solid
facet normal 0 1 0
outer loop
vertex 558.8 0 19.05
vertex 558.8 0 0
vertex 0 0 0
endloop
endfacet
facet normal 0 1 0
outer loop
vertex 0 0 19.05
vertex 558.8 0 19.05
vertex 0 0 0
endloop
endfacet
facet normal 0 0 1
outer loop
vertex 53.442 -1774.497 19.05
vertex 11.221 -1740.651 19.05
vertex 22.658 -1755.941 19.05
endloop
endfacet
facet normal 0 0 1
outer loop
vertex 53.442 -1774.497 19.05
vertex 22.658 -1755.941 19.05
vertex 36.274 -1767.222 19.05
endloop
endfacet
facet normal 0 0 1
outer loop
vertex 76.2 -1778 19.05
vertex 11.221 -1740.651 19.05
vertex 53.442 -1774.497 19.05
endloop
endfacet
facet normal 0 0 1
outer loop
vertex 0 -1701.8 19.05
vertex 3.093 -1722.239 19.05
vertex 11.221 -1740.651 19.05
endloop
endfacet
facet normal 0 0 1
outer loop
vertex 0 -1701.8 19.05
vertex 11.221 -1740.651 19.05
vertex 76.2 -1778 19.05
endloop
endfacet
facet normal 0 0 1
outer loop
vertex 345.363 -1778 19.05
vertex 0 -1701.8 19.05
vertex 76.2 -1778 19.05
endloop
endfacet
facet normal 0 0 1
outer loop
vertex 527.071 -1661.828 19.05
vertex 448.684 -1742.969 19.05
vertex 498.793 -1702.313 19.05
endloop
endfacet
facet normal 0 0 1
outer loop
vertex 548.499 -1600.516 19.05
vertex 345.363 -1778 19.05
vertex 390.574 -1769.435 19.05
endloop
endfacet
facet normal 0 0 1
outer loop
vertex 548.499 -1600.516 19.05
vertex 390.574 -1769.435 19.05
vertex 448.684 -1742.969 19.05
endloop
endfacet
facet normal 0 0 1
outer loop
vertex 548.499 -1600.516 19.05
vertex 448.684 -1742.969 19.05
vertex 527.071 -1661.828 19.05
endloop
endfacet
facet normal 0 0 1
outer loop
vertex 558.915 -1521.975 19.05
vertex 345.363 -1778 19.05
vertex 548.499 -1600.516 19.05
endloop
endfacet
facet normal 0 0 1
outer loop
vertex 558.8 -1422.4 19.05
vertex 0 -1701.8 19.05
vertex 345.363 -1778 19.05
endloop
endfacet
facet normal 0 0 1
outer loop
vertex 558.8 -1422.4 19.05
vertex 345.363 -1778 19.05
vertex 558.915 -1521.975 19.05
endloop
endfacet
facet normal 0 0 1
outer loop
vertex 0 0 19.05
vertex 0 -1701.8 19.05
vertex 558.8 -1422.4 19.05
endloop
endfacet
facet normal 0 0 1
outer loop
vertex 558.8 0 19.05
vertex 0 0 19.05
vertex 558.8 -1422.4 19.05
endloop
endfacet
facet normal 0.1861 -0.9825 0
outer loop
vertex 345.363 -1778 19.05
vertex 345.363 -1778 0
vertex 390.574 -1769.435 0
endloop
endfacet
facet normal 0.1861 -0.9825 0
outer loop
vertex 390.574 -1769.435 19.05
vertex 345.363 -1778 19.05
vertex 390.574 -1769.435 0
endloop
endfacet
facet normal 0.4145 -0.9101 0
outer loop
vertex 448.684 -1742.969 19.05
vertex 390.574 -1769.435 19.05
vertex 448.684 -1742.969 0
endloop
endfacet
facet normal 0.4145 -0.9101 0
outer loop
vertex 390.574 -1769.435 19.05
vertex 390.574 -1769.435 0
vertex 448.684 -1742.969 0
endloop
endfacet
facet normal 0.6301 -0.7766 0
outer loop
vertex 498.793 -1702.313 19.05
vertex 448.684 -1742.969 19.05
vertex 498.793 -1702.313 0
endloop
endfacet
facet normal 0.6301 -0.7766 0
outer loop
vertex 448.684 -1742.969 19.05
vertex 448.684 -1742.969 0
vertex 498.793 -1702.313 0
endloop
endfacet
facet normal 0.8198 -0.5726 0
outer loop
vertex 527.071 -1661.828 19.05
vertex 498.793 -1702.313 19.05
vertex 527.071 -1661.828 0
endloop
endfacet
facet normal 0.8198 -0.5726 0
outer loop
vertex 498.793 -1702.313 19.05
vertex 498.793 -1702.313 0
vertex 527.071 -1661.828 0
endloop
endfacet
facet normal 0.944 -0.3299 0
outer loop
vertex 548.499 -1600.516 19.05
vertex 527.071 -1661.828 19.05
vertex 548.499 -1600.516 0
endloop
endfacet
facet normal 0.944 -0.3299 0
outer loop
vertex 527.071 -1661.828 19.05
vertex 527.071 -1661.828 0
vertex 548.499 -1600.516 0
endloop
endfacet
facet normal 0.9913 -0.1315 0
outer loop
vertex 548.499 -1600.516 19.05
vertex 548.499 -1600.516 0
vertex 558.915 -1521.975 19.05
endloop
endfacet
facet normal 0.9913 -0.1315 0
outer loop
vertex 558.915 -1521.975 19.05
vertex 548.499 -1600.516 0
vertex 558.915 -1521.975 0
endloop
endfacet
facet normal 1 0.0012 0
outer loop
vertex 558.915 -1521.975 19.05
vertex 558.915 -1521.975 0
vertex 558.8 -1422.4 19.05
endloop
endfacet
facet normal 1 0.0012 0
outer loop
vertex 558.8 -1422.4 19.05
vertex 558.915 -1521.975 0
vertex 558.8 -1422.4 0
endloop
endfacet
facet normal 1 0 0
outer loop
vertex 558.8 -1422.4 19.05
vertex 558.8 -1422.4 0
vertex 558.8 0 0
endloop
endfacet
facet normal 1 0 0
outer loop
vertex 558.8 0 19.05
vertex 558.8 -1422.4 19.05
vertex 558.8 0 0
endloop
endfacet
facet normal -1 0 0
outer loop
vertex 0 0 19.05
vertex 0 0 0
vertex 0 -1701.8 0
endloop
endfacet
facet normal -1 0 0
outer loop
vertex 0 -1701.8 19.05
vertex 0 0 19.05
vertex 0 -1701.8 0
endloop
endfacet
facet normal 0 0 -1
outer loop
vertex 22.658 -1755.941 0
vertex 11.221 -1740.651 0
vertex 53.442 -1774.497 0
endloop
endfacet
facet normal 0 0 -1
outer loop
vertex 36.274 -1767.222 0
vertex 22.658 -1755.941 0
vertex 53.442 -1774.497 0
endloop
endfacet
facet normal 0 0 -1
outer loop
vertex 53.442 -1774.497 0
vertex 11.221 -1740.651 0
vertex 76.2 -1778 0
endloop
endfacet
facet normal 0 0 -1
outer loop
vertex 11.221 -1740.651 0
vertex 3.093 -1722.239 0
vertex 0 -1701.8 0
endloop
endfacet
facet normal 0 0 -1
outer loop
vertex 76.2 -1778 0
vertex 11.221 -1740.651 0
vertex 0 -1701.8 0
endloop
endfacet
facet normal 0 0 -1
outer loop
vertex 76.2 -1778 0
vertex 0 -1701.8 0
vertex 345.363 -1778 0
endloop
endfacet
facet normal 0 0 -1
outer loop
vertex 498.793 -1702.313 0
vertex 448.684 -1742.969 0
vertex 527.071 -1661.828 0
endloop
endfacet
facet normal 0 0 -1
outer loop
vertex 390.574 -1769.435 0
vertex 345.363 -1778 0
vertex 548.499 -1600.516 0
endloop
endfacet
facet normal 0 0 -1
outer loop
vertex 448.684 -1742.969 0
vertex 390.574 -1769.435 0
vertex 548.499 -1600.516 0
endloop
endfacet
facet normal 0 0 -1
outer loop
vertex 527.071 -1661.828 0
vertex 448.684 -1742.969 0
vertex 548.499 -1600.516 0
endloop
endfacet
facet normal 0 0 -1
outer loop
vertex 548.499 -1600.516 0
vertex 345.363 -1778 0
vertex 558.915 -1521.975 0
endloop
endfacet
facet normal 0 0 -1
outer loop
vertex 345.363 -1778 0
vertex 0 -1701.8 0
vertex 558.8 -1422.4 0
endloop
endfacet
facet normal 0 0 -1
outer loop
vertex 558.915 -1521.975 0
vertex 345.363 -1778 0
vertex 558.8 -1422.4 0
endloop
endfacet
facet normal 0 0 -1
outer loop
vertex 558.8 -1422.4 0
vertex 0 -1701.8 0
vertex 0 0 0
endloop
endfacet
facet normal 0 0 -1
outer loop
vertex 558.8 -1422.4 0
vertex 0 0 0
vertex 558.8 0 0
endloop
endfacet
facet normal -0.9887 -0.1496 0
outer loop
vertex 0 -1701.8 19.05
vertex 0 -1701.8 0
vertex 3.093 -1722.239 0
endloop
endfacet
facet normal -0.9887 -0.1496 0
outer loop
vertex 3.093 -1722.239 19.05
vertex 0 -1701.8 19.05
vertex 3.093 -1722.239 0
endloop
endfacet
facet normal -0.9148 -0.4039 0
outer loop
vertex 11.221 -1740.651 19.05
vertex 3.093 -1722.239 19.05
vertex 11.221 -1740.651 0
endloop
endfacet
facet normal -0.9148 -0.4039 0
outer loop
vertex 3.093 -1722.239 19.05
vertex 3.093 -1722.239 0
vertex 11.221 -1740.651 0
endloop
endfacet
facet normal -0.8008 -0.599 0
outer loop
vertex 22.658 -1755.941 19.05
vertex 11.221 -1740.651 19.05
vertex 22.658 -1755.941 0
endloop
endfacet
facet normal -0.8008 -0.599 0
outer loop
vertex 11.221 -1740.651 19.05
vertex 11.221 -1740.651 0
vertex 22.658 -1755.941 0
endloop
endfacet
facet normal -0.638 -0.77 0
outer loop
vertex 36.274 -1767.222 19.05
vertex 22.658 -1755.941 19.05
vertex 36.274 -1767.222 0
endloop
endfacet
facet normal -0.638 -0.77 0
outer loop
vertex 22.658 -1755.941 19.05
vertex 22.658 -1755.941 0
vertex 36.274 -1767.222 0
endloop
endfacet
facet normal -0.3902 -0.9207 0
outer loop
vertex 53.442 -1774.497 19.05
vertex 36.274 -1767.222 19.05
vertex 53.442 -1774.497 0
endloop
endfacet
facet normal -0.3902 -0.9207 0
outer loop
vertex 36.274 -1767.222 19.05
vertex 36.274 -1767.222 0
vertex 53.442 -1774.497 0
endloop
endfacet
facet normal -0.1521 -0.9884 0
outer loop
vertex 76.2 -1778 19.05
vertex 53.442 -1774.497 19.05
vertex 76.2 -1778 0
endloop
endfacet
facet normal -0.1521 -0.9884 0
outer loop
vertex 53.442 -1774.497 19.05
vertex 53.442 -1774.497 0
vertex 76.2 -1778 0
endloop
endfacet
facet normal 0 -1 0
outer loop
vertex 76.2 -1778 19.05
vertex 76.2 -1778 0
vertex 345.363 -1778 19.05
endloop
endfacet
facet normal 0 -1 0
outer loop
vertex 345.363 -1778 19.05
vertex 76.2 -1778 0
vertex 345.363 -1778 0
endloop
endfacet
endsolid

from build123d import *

# Parameters (mm, degrees)
F1_DEPTH = 19.05


with BuildPart() as f1:
    # F0 (on Top) → F1 (new body)
    with BuildSketch(Plane.XY):
        with BuildLine():
            Line((558.8, 0), (0, 0))
            Line((0, 0), (0, -1701.8))
            add(Edge.make_bspline(
                [(0, -1701.8), (0, -1723.0126857758), (20.4032110481, -1762.3765253083), (50.1246452332, -1776.3141393661), (76.2, -1778)],
                knots=[0, 0, 0, 0, 0.502969463, 1, 1, 1, 1], degree=3))
            Line((76.2, -1778), (345.3625738621, -1778))
            add(Edge.make_bspline(
                [(345.3625738621, -1778), (383.3805975649, -1777.7376785993), (581.4711342274, -1711.6133681708), (558.7133577058, -1453.0900991245), (558.8, -1422.4)],
                knots=[0, 0, 0, 0, 0.4748726705, 1, 1, 1, 1], degree=3))
            Line((558.8, -1422.4), (558.8, 0))
        make_face()
    extrude(amount=F1_DEPTH)


solid = f1.part
